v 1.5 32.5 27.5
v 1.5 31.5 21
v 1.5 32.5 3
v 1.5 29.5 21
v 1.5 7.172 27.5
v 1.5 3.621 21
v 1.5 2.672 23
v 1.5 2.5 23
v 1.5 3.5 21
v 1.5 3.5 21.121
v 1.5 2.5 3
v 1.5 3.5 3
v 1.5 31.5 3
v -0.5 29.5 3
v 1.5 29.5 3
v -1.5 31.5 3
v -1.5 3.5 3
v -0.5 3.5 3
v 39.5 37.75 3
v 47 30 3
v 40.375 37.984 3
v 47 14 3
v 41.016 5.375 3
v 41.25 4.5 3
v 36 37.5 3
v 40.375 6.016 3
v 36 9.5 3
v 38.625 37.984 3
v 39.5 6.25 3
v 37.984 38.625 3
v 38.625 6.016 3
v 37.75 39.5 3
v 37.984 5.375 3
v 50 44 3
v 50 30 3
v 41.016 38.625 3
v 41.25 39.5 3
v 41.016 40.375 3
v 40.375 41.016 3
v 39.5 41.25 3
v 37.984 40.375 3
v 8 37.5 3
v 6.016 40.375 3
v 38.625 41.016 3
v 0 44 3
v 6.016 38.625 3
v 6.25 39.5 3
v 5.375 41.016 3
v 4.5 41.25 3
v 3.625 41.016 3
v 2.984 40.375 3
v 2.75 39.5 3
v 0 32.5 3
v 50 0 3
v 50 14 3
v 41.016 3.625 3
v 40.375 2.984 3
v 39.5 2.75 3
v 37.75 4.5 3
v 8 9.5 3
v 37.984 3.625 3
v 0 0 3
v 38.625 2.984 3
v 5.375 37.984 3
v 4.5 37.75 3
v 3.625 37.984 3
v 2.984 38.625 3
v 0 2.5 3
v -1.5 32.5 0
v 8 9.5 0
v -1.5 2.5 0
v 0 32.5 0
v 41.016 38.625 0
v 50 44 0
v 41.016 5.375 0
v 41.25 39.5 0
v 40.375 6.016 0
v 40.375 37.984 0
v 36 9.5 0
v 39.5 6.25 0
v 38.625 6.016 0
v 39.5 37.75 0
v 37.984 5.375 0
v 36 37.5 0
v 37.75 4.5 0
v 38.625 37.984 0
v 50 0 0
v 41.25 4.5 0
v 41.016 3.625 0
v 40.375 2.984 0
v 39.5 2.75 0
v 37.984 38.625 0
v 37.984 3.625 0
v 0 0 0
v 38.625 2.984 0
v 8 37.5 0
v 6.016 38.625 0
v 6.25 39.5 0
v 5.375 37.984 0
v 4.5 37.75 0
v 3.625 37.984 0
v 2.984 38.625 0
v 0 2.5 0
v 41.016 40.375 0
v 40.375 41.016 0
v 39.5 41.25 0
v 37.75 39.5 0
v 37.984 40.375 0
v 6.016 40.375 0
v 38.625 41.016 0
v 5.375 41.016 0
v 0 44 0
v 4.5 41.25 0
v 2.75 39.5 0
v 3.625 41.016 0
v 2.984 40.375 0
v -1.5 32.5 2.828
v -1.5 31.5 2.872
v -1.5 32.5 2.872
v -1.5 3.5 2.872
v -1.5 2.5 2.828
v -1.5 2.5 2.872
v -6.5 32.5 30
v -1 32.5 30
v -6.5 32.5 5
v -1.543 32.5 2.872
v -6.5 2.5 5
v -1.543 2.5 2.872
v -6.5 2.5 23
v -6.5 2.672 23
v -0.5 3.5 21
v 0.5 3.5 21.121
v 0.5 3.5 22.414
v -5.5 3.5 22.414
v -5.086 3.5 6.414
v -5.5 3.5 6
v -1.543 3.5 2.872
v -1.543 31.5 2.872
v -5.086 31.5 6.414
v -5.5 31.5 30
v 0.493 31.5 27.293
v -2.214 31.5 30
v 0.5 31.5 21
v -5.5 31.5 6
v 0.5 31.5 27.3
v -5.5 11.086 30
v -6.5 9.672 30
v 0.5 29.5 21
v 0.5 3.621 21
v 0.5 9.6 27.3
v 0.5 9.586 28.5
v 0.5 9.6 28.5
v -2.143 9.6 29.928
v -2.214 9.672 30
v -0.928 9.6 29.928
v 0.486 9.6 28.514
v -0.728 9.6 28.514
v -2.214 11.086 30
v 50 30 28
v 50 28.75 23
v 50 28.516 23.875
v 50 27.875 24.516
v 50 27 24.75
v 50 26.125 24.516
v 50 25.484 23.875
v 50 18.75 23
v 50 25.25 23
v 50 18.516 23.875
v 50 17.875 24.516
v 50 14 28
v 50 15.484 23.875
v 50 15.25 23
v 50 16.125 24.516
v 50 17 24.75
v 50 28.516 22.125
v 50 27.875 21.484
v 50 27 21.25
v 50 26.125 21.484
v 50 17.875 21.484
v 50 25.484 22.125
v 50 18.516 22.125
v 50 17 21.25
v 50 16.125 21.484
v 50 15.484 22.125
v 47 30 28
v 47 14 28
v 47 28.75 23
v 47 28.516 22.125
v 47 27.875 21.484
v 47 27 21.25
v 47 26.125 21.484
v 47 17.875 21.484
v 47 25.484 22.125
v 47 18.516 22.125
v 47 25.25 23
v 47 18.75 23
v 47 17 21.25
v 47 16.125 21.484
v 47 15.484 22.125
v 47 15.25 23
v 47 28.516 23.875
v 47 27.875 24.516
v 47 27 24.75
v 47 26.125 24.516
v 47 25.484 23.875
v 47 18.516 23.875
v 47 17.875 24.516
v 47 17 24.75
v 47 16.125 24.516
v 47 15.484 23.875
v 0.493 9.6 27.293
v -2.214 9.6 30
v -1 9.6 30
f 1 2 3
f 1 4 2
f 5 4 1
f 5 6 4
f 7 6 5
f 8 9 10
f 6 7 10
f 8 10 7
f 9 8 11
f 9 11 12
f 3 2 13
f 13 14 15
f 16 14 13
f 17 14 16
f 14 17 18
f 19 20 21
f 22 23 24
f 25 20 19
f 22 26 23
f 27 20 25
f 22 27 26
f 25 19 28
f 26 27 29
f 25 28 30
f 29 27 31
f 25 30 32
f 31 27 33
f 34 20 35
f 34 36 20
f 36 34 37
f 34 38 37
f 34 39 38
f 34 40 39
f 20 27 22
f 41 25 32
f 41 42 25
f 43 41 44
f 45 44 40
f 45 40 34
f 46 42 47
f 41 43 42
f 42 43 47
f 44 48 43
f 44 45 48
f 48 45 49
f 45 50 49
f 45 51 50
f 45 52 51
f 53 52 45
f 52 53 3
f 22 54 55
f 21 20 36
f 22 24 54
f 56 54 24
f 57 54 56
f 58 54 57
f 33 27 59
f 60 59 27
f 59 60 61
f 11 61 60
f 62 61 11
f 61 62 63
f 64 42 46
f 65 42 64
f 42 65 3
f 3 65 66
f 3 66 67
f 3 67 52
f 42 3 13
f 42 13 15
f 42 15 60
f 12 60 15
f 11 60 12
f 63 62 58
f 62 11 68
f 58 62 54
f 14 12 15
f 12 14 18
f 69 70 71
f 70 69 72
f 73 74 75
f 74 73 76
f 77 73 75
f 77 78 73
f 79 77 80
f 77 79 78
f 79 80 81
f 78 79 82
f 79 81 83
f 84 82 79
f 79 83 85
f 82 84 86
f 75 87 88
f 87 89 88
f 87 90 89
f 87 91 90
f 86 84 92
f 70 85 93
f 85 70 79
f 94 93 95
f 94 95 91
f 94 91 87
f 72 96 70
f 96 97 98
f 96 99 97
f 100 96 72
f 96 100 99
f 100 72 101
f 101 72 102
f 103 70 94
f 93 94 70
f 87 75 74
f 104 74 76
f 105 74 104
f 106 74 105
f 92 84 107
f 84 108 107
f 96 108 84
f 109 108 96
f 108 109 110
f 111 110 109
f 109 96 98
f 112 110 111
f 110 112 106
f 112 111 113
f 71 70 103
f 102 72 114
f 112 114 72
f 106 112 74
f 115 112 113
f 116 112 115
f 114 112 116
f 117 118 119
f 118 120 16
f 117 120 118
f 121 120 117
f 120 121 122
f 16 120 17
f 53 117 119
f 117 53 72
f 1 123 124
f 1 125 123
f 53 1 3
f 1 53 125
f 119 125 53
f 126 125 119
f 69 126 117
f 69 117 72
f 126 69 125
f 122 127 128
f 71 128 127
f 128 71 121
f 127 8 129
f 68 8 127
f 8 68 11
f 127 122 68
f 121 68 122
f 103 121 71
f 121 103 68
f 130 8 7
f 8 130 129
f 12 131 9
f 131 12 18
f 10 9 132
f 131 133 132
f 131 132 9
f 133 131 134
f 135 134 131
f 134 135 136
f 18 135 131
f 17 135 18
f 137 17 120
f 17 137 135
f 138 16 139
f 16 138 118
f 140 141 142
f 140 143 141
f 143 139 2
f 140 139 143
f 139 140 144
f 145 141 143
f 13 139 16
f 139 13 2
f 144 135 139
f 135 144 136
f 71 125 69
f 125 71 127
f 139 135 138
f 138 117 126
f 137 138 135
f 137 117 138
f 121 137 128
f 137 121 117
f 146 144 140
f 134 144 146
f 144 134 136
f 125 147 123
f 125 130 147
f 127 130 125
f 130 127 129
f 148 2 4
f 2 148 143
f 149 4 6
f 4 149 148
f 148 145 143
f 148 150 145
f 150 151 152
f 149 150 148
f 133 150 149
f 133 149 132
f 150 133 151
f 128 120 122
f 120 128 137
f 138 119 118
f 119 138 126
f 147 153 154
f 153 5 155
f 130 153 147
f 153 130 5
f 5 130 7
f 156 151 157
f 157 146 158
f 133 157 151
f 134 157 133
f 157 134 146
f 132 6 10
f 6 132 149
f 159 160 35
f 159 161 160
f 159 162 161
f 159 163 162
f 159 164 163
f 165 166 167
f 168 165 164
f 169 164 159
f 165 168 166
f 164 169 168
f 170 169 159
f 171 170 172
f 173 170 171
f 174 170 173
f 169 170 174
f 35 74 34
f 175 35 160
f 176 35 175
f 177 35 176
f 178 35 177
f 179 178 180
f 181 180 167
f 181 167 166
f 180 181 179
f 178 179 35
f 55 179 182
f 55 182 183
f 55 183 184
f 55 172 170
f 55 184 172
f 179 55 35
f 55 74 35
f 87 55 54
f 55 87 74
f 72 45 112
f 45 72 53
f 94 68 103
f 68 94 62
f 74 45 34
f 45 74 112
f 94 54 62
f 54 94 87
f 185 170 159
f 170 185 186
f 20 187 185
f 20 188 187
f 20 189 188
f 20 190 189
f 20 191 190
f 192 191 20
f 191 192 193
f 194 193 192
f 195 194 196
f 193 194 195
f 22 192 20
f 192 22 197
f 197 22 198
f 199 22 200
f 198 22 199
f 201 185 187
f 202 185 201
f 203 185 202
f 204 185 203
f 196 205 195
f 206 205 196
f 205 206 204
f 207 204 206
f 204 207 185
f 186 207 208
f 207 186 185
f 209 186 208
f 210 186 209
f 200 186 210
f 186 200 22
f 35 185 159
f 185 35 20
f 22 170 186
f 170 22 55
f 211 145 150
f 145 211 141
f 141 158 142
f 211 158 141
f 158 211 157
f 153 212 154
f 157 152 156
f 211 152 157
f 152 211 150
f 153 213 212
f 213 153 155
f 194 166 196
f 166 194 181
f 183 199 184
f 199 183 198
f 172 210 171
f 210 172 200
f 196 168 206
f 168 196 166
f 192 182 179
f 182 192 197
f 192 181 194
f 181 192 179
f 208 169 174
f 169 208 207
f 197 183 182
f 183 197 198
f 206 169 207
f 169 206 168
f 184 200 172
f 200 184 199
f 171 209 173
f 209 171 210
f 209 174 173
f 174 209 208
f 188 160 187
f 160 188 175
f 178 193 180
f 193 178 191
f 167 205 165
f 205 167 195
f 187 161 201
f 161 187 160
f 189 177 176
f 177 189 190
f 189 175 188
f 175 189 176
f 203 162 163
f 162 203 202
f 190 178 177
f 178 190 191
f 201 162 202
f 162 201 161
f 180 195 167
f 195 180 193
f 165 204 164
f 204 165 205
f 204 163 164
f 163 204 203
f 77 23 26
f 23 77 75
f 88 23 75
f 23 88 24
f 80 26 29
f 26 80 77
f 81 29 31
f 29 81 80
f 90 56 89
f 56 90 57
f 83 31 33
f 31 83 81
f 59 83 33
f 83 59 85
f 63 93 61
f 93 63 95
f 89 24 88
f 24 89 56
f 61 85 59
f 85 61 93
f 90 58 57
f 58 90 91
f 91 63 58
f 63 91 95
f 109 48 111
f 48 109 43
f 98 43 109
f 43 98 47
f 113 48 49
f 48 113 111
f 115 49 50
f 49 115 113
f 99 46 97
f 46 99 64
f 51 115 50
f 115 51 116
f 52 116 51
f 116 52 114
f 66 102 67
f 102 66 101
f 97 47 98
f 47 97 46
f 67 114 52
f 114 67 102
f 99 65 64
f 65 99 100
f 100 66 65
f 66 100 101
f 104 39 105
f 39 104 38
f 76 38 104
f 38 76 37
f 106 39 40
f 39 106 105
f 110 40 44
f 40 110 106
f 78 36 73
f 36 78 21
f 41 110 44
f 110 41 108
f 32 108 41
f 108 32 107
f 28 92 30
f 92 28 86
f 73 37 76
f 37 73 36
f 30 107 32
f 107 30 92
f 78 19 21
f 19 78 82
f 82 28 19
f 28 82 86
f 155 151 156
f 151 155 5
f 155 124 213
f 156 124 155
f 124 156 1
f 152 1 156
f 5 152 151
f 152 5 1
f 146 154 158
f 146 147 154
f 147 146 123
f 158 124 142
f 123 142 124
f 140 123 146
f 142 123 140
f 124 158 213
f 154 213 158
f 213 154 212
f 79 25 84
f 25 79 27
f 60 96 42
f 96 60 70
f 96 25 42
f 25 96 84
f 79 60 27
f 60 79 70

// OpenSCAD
thickness=3;

difference()
{
    union()
    {
        cube(size=[50,44,thickness]);
        
        //translate([49,44-14,thickness])
          //  cube(size=[3,14,16+8+5]);
        translate([47,44/2-8,thickness])
            cube(size=[3,8*2,25]);
        
        translate([1.2,9.6,28])
            rotate([0,45+180,0])
                cube([10,22.8,1]);
        
        union()
        {
            translate([-3+1.5,2.5,0])
                cube(size=[3,30,thickness]);
            //translate([-5+1.5,2.5+15,20+1])
            //    cube(size=[5,15,2]);
            translate([-3+1.5,2.5,thickness])
                cube(size=[3,1,20]);
            
            translate([-3+1.5,30-2+2.5+1,thickness])
                cube(size=[3,1,20+15]);
            
            translate([-3+sqrt(2)+1.5,2.5,0+sqrt(2)])
                rotate([0,45+180,0])
                    cube(size=[5*sqrt(2),30,2]);
            
            translate([-3-5+1.5,2.5,0+5])
                cube(size=[1,30,18]);
            
            translate([-3-5+1.5+2-2,2.5+15,0+5+20-2])
                cube(size=[1,30-15,15]);
            translate([-3+1.5+3+1-2,2.5+15,0+5+20-4])
                cube(size=[1,30-15,15]);
            
            translate([-3-5+1.5+2-1,2.5,0+5-2*sqrt(2)+0.7])
                cube([2*sqrt(2)+1+1,1,17.3+2*sqrt(2)]);
            translate([-3-5+1.5+2-1,30-2+2.5+1,0+5-2*sqrt(2)+0.7])
                cube([2*sqrt(2)+1+1,1,17.3+15+2*sqrt(2)]);
                
            translate([-3+1.5-5,2.5+sqrt(2)/2,sqrt(2)/2+20+sqrt(2)])
                rotate([45,0,0])
                    cube(size=[5+3,15*sqrt(2),1]);
                    
            translate([-3+1.5-5,2.5,sqrt(2)+20+sqrt(2)/2])
                rotate([45+270,0,0])
                    cube(size=[1,15*sqrt(2)-5,15*sqrt(2)]);
            translate([-3+1.5+3+1-2,2.5,sqrt(2)+20+sqrt(2)/2])
                rotate([45+270,0,0])
                    cube(size=[1,15*sqrt(2)-5,15*sqrt(2)]);
        }
        
    }
    
    union()
    {
        translate([2,0,27])
            rotate([0,45+270,0])
                cube([10,35,5]);
        
        translate([-10,0,30])
            cube(size=[20,44,30]);
        
        translate([(44-28)/2,(44-28)/2+1.5,0])
            cube(size=[28,28,5]);
        
        //translate([44,0,0])
        //    cube(size=[8,22,thickness]);
        
        translate([-5+1.5+3,2.5+1,thickness])
            cube(size=[2,30-2-2,20-2]);
        
        translate([-1.5,0,0])
            rotate([0,45+180,0])
                cube(size=[10,50,10]);
        
        union()
        {
            translate([47,44/2-5,25-thickness+1])
                rotate([0,90,0])
                    cylinder(d=3.5,h=5,$fn=12);
            /*translate([49,44-14+5+5,thickness+5+1+9+12.5+5])
                rotate([0,90,0])
                    cylinder(d=3.5,h=5,$fn=12);*/
            
            translate([47,44/2+5,25-thickness+1])
                rotate([0,90,0])
                    cylinder(d=3.5,h=5,$fn=12);
        }
        
        union()
        {
            //translate([(44-35)/2,(44-35)/2,0])
            //    cylinder(d=3.5,h=5,$fn=12);
            translate([44-(44-35)/2,(44-35)/2,0])
                cylinder(d=3.5,h=5,$fn=12);
            translate([(44-35)/2,44-(44-35)/2,0])
                cylinder(d=3.5,h=5,$fn=12);
            translate([44-(44-35)/2,44-(44-35)/2,0])
                cylinder(d=3.5,h=5,$fn=12);
        }
        
    }
}
/*
        union()
        {
            for(i=[5:3:30])
            {
                translate([-3+1.5+1.5,i,thickness])
                    cube(size=[2,0.3,18]);
            }
            
        }*/
